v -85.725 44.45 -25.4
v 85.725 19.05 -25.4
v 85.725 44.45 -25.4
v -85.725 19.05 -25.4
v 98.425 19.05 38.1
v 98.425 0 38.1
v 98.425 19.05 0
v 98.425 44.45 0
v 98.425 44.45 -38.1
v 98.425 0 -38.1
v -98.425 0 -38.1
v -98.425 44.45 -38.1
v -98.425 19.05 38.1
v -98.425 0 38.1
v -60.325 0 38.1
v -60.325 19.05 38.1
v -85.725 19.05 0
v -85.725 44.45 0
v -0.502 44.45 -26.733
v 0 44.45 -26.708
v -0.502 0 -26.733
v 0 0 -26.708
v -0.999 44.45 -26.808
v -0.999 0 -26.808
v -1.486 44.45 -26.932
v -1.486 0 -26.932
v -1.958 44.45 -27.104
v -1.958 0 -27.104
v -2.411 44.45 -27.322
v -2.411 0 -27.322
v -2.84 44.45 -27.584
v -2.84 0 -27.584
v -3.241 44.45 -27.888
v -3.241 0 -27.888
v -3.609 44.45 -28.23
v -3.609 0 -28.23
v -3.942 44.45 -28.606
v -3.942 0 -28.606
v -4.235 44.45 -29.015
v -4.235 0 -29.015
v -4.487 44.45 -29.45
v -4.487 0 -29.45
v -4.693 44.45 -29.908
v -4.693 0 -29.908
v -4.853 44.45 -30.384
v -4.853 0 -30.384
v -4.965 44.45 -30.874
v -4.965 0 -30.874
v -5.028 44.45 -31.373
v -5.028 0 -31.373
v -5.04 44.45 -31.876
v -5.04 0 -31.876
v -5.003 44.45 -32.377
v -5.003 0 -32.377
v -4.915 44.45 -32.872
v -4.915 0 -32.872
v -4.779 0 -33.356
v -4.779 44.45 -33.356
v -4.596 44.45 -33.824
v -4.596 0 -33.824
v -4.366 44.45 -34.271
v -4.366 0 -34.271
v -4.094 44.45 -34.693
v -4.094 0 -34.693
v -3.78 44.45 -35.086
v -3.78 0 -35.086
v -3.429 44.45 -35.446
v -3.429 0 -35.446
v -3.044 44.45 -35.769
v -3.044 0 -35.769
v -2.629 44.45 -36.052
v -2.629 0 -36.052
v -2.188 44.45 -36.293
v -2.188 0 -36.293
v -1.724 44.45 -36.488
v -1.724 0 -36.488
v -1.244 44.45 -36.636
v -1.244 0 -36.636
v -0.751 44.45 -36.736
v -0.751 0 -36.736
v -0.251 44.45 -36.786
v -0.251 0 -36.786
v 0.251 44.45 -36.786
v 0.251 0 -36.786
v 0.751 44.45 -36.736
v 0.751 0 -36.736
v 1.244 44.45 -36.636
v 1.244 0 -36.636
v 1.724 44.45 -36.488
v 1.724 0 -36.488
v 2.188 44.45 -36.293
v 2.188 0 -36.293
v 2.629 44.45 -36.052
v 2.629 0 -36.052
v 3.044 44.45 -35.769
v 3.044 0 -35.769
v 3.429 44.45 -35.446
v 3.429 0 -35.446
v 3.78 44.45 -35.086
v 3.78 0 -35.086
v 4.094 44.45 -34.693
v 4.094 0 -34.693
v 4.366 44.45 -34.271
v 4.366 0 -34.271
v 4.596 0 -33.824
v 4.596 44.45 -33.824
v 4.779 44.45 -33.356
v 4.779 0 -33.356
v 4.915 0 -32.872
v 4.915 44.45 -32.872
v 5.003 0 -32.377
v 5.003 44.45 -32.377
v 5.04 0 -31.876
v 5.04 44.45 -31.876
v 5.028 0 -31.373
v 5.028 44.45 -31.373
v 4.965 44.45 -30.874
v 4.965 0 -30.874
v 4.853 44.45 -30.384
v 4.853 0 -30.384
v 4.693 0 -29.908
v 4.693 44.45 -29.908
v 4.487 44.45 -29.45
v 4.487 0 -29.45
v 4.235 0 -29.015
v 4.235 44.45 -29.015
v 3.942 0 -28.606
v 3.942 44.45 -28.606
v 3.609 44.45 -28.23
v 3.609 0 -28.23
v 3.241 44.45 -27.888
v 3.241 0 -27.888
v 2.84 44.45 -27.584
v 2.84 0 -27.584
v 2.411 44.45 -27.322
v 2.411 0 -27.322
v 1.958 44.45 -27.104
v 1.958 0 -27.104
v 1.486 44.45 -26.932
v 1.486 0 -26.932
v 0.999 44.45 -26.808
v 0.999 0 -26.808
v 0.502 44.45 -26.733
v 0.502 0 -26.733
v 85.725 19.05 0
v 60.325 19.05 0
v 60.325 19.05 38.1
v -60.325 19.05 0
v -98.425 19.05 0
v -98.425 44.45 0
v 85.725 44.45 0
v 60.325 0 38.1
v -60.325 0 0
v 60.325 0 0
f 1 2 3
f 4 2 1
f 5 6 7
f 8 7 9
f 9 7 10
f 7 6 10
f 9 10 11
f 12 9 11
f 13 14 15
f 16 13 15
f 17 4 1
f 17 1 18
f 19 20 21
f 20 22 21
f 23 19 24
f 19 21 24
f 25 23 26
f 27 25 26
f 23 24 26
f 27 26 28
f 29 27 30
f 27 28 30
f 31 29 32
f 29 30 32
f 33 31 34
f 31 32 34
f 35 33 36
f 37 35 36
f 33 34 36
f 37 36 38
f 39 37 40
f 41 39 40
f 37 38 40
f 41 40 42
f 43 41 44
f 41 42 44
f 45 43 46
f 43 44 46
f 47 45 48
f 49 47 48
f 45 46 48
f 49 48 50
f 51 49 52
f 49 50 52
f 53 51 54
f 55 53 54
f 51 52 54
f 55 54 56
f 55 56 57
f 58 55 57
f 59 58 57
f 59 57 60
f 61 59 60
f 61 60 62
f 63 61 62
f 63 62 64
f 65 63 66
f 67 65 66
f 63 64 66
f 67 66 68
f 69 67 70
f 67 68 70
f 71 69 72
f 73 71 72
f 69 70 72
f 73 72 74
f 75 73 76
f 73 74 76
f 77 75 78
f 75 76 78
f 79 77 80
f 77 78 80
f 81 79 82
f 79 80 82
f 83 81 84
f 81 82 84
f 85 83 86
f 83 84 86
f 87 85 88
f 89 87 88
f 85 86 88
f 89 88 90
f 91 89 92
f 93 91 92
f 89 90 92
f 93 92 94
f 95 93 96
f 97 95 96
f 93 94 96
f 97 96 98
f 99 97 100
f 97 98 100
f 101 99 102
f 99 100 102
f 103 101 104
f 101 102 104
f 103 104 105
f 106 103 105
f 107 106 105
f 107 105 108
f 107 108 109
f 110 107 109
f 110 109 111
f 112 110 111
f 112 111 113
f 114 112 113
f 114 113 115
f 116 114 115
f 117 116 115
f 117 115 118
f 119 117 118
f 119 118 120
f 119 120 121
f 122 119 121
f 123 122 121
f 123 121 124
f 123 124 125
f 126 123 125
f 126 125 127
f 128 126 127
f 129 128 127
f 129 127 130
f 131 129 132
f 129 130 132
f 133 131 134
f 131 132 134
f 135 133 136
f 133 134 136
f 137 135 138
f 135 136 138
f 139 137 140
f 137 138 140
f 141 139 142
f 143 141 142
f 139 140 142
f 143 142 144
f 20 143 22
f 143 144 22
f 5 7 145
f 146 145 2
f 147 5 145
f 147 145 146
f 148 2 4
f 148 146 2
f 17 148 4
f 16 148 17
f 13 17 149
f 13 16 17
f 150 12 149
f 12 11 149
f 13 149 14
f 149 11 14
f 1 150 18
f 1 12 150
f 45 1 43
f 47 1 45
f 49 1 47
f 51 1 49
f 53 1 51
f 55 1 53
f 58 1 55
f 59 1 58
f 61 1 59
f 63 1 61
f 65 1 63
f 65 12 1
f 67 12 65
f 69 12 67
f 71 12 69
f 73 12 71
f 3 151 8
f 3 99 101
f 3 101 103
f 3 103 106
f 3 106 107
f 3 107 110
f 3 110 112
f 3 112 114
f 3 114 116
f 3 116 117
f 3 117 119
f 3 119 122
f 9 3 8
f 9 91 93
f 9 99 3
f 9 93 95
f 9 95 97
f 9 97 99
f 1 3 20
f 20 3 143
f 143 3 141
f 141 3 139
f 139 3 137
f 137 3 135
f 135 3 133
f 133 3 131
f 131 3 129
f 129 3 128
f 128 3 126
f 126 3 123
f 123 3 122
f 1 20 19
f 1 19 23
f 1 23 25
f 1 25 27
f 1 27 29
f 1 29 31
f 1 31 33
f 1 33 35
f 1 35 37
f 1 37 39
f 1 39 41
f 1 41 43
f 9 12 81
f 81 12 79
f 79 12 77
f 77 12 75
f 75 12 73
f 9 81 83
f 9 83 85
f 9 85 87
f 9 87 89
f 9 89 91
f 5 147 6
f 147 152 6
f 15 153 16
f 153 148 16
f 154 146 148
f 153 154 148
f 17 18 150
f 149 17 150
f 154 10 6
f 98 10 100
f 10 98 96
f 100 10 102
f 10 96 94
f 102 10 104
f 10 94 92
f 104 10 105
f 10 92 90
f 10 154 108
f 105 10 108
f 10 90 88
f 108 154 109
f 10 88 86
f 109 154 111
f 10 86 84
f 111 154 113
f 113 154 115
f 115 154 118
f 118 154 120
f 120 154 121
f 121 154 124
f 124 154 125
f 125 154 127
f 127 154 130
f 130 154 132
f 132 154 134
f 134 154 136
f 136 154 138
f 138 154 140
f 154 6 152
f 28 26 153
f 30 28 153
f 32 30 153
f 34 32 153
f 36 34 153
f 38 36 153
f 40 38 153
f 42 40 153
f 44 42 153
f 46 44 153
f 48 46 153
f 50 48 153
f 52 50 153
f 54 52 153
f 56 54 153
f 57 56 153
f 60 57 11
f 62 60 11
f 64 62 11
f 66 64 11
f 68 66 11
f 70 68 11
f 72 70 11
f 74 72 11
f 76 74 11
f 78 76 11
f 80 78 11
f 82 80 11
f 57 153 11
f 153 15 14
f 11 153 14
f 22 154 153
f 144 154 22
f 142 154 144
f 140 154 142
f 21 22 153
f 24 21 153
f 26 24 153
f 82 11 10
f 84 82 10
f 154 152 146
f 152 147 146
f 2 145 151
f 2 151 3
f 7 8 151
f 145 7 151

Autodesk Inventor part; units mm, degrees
ref_plane "YZ Plane" through (0, 0, 0) normal (1, 0, 0) x (0, 1, 0)
ref_plane "XZ Plane" through (0, 0, 0) normal (0, 1, 0) x (-1, 0, 0)
ref_plane "XY Plane" through (0, 0, 0) normal (0, 0, 1) x (1, 0, 0)
sketch "Sketch1" plane through (0, 0, 0) normal (0, 1, 0) x (-1, 0, 0)
  line L0 (98.425, 38.1) -> (-98.425, 38.1)
  line L1 (-98.425, 38.1) -> (-98.425, -38.1)
  line L2 (-98.425, -38.1) -> (98.425, -38.1)
  line L3 (98.425, -38.1) -> (98.425, 38.1)
  line L4 (98.425, 38.1) -> (-98.425, -38.1) construction
  line L5 (-98.425, 38.1) -> (98.425, -38.1) construction
  point P0 (0, 0)
  dimension "length" = 196.85
  dimension "width" = 76.2
extrude "Extrusion1" add sketch "Sketch1" along normal blind 19.05
sketch "Sketch3" plane through (0, 19.05, 0) normal (0, 1, 0) x (1, 0, 0)
  line L0 (98.425, 38.1) -> (-98.425, 38.1) projected
  line L1 (-98.425, 38.1) -> (98.425, 38.1)
  line L2 (98.425, 38.1) -> (98.425, 0)
  line L3 (98.425, -38.1) -> (98.425, 38.1) projected
  line L4 (98.425, 0) -> (85.725, 0)
  line L5 (85.725, 0) -> (85.725, 25.4)
  line L6 (85.725, 25.4) -> (-85.725, 25.4)
  line L7 (-85.725, 25.4) -> (-85.725, 0)
  line L8 (-85.725, 0) -> (-98.425, 0)
  line L9 (-98.425, 38.1) -> (-98.425, -38.1) projected
  line L10 (-98.425, 0) -> (-98.425, 38.1)
  point P0 (0, 0)
  dimension "d9" = 38.1
  dimension "batterSupportSideEdge" = 12.7
  dimension "batterySupportCutOut" = 25.4
  dimension "d28" = 12.7
extrude "Extrusion2" add sketch "Sketch3" along normal blind 25.4
sketch "Sketch4" plane through (0, 44.45, 0) normal (0, 1, 0) x (1, 0, 0)
  line L0 (98.425, 38.1) -> (-98.425, 38.1) construction
  line L1 (0, 38.1) -> (0, 25.4) construction
  line L2 (-85.725, 25.4) -> (85.725, 25.4) projected
  point P0 (0, 0)
  point P1 (0, 31.75)
  dimension "d14" = 6.35
hole "Hole1" at (0, 44.45, -31.75) direction (0, -1, 0) diameter 10.0838 end through all clearance for "Hex Head Bolt" size "3/8" standard "Ansi Unified Screw Threads"
sketch "Sketch5" plane through (0, 19.05, 0) normal (0, 1, 0) x (1, 0, 0)
  line L0 (-60.325, -38.1) -> (60.325, -38.1)
  line L1 (60.325, -38.1) -> (60.325, 0)
  line L2 (60.325, 0) -> (-60.325, 0)
  line L3 (-60.325, 0) -> (-60.325, -38.1)
  line L4 (-98.425, 0) -> (-98.425, -38.1) projected
  line L5 (98.425, -38.1) -> (98.425, 0) projected
  line L6 (85.725, 25.4) -> (-85.725, 25.4) projected
  point P0 (0, 0)
  dimension "d22" = 38.1
  dimension "d23" = 38.1
  dimension "d24" = 25.4
extrude "Extrusion3" cut sketch "Sketch5" against normal through all
properties part number "BatteryHolder"
